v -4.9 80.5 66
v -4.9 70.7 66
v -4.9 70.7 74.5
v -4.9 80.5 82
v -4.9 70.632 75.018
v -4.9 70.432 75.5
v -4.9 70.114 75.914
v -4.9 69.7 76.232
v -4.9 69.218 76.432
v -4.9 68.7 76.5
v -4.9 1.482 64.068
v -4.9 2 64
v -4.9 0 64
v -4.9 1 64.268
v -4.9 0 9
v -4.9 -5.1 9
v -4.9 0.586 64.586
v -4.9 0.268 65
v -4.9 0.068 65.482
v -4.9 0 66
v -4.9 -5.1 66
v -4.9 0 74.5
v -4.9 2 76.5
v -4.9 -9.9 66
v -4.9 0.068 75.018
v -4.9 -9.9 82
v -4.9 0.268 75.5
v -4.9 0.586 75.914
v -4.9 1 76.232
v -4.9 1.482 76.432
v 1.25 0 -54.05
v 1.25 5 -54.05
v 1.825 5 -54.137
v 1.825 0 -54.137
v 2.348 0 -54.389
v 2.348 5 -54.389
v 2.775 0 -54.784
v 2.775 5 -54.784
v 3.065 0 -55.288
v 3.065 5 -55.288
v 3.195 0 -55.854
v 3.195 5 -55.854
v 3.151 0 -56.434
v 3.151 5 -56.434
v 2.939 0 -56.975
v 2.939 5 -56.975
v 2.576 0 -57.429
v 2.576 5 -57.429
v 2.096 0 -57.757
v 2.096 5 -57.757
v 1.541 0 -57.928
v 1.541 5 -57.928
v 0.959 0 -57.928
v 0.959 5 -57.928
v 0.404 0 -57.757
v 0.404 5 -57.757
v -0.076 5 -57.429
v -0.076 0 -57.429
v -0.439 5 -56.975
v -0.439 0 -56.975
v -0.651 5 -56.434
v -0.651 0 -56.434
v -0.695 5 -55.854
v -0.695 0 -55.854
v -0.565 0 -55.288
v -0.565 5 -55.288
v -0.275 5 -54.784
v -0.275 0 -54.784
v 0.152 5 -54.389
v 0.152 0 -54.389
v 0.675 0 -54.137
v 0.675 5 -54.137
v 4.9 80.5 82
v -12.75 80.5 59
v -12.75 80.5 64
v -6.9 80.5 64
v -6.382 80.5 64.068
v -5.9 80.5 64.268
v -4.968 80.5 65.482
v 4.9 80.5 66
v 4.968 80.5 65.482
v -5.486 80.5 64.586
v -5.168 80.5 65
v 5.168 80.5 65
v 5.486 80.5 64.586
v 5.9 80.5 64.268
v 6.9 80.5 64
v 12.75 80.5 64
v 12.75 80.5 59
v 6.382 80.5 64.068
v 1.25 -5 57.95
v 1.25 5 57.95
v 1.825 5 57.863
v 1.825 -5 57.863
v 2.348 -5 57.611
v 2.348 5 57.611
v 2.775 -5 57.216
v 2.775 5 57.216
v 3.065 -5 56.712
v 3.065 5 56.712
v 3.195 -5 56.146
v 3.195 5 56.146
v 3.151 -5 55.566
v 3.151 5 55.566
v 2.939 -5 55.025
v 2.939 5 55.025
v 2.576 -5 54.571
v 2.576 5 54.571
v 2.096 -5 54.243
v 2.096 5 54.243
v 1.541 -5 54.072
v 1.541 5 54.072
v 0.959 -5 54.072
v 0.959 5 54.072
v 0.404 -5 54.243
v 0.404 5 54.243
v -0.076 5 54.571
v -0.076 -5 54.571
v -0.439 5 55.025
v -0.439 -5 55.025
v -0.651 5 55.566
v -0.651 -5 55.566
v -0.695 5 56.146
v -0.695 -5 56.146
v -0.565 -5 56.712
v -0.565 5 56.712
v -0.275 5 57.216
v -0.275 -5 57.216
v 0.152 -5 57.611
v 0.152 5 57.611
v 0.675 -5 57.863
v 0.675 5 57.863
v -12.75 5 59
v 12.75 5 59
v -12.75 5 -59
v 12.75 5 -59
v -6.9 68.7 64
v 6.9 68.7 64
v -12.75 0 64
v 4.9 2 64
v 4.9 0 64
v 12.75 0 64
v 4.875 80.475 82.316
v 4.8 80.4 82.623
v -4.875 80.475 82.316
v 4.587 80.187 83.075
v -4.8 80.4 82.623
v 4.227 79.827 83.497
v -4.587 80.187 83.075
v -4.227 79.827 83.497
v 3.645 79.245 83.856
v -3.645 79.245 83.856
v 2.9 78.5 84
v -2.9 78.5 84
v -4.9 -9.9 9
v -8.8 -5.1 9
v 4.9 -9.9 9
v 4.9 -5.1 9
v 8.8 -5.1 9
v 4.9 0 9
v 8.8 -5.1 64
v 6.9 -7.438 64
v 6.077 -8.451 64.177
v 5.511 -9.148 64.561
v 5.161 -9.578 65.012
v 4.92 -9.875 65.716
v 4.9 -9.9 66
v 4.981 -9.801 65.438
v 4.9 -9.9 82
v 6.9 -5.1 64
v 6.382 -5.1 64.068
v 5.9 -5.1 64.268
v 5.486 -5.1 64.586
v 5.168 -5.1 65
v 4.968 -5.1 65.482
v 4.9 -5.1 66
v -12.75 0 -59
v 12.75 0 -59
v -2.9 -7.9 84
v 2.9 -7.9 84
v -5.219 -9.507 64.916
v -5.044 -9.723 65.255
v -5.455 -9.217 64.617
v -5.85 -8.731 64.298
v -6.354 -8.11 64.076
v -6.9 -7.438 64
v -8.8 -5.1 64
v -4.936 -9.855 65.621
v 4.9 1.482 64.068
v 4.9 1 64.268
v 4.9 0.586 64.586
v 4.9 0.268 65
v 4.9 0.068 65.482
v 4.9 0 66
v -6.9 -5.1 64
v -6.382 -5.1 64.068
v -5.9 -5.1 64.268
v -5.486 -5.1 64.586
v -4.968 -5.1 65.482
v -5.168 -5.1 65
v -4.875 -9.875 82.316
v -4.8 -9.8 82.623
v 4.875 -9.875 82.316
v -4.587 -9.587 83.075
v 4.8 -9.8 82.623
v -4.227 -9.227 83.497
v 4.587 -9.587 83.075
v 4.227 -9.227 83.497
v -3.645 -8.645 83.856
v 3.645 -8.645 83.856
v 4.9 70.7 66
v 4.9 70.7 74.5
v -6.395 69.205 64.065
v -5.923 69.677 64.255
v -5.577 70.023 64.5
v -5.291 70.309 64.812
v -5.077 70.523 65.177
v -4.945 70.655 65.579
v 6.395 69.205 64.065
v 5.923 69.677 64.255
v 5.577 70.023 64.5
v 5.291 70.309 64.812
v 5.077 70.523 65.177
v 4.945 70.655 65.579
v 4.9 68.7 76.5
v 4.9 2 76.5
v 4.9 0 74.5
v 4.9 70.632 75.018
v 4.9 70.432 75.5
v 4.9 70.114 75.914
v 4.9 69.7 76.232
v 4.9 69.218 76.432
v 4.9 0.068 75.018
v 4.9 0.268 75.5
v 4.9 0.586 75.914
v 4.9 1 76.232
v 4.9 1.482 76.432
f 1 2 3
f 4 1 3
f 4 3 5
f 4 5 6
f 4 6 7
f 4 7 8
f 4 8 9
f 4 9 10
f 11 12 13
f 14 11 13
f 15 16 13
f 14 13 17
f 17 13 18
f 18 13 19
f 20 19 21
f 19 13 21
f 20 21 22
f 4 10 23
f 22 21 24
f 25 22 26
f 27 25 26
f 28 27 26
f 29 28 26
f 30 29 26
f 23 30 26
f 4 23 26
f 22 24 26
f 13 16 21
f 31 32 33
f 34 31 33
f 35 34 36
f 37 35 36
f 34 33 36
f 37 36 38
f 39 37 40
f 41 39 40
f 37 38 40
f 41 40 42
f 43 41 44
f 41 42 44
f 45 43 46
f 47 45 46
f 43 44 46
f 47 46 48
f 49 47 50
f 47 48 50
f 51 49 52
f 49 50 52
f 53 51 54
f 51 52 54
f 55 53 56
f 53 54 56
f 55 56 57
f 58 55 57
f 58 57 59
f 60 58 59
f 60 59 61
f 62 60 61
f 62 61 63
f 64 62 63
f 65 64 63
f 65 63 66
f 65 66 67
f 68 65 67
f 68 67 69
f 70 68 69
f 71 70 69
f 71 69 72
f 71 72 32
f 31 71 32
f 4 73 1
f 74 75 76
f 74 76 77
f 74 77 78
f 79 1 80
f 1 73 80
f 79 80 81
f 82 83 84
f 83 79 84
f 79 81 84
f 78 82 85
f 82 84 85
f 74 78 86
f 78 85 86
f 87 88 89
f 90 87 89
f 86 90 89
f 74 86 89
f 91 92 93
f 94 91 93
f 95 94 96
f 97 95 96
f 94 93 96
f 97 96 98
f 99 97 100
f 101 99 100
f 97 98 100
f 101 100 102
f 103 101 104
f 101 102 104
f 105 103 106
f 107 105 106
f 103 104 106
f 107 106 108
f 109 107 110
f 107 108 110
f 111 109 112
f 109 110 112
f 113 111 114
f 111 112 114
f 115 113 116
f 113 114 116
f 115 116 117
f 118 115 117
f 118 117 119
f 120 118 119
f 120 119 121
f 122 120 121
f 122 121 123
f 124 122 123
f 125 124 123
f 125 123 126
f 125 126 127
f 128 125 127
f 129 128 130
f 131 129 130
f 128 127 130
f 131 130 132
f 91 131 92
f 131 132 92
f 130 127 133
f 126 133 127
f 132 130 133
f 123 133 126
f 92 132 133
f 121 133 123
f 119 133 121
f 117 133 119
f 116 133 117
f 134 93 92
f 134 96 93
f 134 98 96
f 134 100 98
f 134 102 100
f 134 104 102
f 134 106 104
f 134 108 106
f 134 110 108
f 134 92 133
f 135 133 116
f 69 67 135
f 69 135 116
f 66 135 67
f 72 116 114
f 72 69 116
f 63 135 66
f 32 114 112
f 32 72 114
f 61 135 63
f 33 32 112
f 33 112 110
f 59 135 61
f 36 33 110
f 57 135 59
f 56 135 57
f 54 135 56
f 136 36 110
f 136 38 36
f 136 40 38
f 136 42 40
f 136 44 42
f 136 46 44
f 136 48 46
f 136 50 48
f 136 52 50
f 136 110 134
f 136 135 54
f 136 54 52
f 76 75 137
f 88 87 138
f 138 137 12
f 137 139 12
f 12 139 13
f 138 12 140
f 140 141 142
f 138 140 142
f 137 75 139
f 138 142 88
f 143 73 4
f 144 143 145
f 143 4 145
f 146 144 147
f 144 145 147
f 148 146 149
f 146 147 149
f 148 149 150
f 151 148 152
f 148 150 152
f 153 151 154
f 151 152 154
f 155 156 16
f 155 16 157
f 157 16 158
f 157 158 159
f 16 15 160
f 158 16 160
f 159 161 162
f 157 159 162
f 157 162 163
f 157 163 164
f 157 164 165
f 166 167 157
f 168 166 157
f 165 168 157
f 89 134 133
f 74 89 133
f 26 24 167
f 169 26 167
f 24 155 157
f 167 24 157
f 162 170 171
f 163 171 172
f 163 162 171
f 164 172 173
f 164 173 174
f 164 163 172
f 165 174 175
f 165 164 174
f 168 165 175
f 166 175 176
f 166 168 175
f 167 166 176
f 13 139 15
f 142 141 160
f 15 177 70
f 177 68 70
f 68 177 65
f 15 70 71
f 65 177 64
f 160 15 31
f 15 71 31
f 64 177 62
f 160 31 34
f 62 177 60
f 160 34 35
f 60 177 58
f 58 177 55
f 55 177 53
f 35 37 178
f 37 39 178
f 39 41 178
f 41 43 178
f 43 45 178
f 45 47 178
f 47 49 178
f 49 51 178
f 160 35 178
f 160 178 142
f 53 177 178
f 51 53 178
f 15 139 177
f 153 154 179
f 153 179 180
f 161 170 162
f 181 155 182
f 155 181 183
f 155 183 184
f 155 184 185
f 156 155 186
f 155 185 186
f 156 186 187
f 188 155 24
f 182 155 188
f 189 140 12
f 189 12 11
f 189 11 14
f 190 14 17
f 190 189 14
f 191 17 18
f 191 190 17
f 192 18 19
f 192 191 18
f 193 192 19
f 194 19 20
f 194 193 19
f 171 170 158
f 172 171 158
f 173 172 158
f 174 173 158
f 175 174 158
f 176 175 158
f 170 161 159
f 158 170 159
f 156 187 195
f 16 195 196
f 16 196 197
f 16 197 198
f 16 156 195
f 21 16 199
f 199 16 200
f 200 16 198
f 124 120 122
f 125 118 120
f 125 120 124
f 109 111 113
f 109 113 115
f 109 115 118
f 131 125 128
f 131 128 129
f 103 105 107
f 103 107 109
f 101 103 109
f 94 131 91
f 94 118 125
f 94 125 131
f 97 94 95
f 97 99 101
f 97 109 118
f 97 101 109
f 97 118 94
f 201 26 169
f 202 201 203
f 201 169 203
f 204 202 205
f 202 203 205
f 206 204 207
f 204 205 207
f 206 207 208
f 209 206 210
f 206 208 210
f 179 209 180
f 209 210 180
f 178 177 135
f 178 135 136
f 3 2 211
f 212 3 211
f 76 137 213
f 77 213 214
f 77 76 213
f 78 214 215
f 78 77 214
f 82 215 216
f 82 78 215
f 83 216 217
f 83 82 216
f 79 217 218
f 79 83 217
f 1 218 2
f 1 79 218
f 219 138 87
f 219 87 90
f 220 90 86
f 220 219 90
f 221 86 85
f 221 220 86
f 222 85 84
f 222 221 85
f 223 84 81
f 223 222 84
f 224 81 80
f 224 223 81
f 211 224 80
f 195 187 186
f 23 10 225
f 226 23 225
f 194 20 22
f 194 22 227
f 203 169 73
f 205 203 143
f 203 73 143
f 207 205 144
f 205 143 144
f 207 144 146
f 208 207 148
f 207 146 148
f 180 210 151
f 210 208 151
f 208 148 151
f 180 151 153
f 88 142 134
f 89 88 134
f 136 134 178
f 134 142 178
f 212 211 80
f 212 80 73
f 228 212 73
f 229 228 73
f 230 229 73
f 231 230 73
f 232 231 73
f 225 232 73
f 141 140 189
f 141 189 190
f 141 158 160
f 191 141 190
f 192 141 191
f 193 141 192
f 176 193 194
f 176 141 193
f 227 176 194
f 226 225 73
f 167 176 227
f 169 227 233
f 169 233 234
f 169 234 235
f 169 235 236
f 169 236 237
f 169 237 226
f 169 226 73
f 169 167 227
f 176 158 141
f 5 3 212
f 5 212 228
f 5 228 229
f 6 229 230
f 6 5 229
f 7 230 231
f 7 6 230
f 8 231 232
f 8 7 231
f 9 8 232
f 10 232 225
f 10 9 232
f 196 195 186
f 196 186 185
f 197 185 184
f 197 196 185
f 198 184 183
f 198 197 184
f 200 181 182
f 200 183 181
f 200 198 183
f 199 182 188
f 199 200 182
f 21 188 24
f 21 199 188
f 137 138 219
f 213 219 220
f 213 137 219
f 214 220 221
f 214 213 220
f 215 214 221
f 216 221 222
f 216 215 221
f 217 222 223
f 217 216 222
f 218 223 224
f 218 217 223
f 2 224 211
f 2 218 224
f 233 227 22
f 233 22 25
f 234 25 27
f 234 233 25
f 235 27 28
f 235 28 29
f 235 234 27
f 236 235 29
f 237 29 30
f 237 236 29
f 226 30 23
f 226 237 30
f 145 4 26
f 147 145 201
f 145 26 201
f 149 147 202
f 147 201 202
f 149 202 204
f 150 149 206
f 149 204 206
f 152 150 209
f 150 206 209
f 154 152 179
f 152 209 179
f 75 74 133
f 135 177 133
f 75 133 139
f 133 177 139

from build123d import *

# Parameters (mm, degrees)
SKETCH1_W            = 25.5
SKETCH1_H            = 118
BOSS_EXTRUDE1_DEPTH  = 5
BOSS_EXTRUDE5_DEPTH  = 50
SKETCH2_R            = 1.95
CUT_EXTRUDE1_DEPTH   = 10
BOSS_EXTRUDE7_DEPTH  = 5
BOSS_EXTRUDE8_DEPTH  = 80.5
SKETCH9_W            = 9.8
SKETCH9_H            = 9.8
SKETCH9_H_2          = 9.9
BOSS_EXTRUDE10_DEPTH = 12.5
SKETCH10_W           = 9.8
SKETCH10_H           = 90.4
BOSS_EXTRUDE11_DEPTH = 7.5
FILLET1_R            = 2


with BuildPart() as part:
    # Sketch1 → Boss-Extrude1 (new body)
    with BuildSketch(Plane(origin=(0, 0, 0), x_dir=(1, 0, 0), z_dir=(0, 1, 0))):
        Rectangle(SKETCH1_W, SKETCH1_H)
    extrude(amount=BOSS_EXTRUDE1_DEPTH)

    # Sketch5 → Boss-Extrude5 (add)
    with BuildSketch(Plane.XY.offset(59)):
        Polygon((-4.9, 0), (-4.9, -5.1), (-8.8, -5.1), (-4.9, -9.9), (4.9, -9.9), (8.8, -5.1), (4.9, -5.1), (4.9, 0), align=None)
    extrude(amount=-BOSS_EXTRUDE5_DEPTH)

    # Sketch2 → Cut-Extrude1 (cut)
    with BuildSketch(Plane(origin=(0, 5, 0), x_dir=(1, 0, 0), z_dir=(0, 1, 0))):
        with Locations(Location((1.25, 56, 0), (0, 0, 270))):
            Circle(SKETCH2_R)
        with Locations(Location((1.25, -56, 0), (0, 0, 270))):
            Circle(SKETCH2_R)
    extrude(amount=-CUT_EXTRUDE1_DEPTH, mode=Mode.SUBTRACT)

    # Sketch5<4> → Boss-Extrude7 (add)
    with BuildSketch(Plane.XY.offset(59)):
        Polygon((-4.9, 0), (-4.9, -5.1), (-8.8, -5.1), (-4.9, -9.9), (4.9, -9.9), (8.8, -5.1), (4.9, -5.1), (4.9, 0), align=None)
    extrude(amount=BOSS_EXTRUDE7_DEPTH)

    # Sketch8 → Boss-Extrude8 (add)
    with BuildSketch(Plane(origin=(0, 0, 0), x_dir=(1, 0, 0), z_dir=(0, 1, 0))):
        Polygon((-4.9, -64), (12.75, -64), (12.75, -59), (-4.9, -59), (-12.75, -59), (-12.75, -64), align=None)
    extrude(amount=BOSS_EXTRUDE8_DEPTH)

    # Sketch9 → Boss-Extrude10 (add)
    with BuildSketch(Plane.XY.offset(64)):
        with Locations((0, 75.6)):
            Rectangle(SKETCH9_W, SKETCH9_H)
        with Locations((0, -4.95)):
            Rectangle(SKETCH9_W, SKETCH9_H_2)
    extrude(amount=BOSS_EXTRUDE10_DEPTH)

    # Sketch10 → Boss-Extrude11 (add)
    with BuildSketch(Plane.XY.offset(76.5)):
        with Locations((0, 35.3)):
            Rectangle(SKETCH10_W, SKETCH10_H)
    extrude(amount=BOSS_EXTRUDE11_DEPTH)

    # Fillet1
    # the kernel refuses this fillet: 2 mm, written as the material it adds along each edge
    with BuildSketch(Plane(origin=(4.9, -9.9, 64), x_dir=(0, 0, 1), z_dir=(0, 1, 0))) as fillet1_piece_1_section:
        with BuildLine():
            CenterArc((FILLET1_R, FILLET1_R), FILLET1_R, 180, 90)
            Line((0, FILLET1_R), (-FILLET1_R * 0.02, FILLET1_R))
            Line((-FILLET1_R * 0.02, FILLET1_R), (-FILLET1_R * 0.02, -FILLET1_R * 0.02))
            Line((-FILLET1_R * 0.02, -FILLET1_R * 0.02), (FILLET1_R, -FILLET1_R * 0.02))
            Line((FILLET1_R, -FILLET1_R * 0.02), (FILLET1_R, 0))
        make_face()
    fillet1_piece_1 = extrude(amount=4.8, mode=Mode.PRIVATE)
    fillet1_piece_1 = split(fillet1_piece_1, bisect_by=Plane(origin=(6.354004959, -8.110455435, 64.484419844), z_dir=(-0.7761140001162659, 0.6305926250944655, 0)), keep=Keep.TOP, mode=Mode.PRIVATE)
    add(fillet1_piece_1)
    with BuildSketch(Plane(origin=(4.9, 0, 64), x_dir=(0, 0, 1), z_dir=(-1, 0, 0))) as fillet1_piece_2_section:
        with BuildLine():
            CenterArc((FILLET1_R, FILLET1_R), FILLET1_R, 180, 90)
            Line((0, FILLET1_R), (-FILLET1_R * 0.02, FILLET1_R))
            Line((-FILLET1_R * 0.02, FILLET1_R), (-FILLET1_R * 0.02, -FILLET1_R * 0.02))
            Line((-FILLET1_R * 0.02, -FILLET1_R * 0.02), (FILLET1_R, -FILLET1_R * 0.02))
            Line((FILLET1_R, -FILLET1_R * 0.02), (FILLET1_R, 0))
        make_face()
    fillet1_piece_2 = extrude(amount=9.8, mode=Mode.PRIVATE)
    fillet1_piece_2 = split(fillet1_piece_2, bisect_by=Plane(origin=(0, 0, 64.406946259), z_dir=(0, 1, 0)), keep=Keep.TOP, mode=Mode.PRIVATE)
    add(fillet1_piece_2)
    with BuildSketch(Plane(origin=(4.9, 0, 76.5), x_dir=(0, 0, -1), z_dir=(-1, 0, 0))) as fillet1_piece_3:
        with BuildLine():
            CenterArc((FILLET1_R, -FILLET1_R), FILLET1_R, 90, 90)
            Line((0, -FILLET1_R), (-FILLET1_R * 0.02, -FILLET1_R))
            Line((-FILLET1_R * 0.02, -FILLET1_R), (-FILLET1_R * 0.02, FILLET1_R * 0.02))
            Line((-FILLET1_R * 0.02, FILLET1_R * 0.02), (FILLET1_R, FILLET1_R * 0.02))
            Line((FILLET1_R, FILLET1_R * 0.02), (FILLET1_R, 0))
        make_face()
    extrude(amount=9.8)
    with BuildSketch(Plane(origin=(4.9, 70.7, 64), x_dir=(0, 0, 1), z_dir=(0, 1, 0)), Plane(origin=(-4.9, 80.5, 64), x_dir=(0, 0, 1), z_dir=(0, -1, 0)), Plane(origin=(-4.9, 70.7, 64), x_dir=(0, 0, 1), z_dir=(1, 0, 0)), Plane(origin=(-4.9, 70.7, 76.5), x_dir=(0, -1, 0), z_dir=(1, 0, 0))) as fillet1_piece_4:
        with BuildLine():
            CenterArc((FILLET1_R, FILLET1_R), FILLET1_R, 180, 90)
            Line((0, FILLET1_R), (-FILLET1_R * 0.02, FILLET1_R))
            Line((-FILLET1_R * 0.02, FILLET1_R), (-FILLET1_R * 0.02, -FILLET1_R * 0.02))
            Line((-FILLET1_R * 0.02, -FILLET1_R * 0.02), (FILLET1_R, -FILLET1_R * 0.02))
            Line((FILLET1_R, -FILLET1_R * 0.02), (FILLET1_R, 0))
        make_face()
    extrude(amount=9.8)
    with BuildSketch(Plane(origin=(-4.9, -5.1, 64), x_dir=(-1, 0, 0), z_dir=(0, -1, 0))) as fillet1_piece_5_section:
        with BuildLine():
            CenterArc((FILLET1_R, -FILLET1_R), FILLET1_R, 90, 90)
            Line((0, -FILLET1_R), (-FILLET1_R * 0.02, -FILLET1_R))
            Line((-FILLET1_R * 0.02, -FILLET1_R), (-FILLET1_R * 0.02, FILLET1_R * 0.02))
            Line((-FILLET1_R * 0.02, FILLET1_R * 0.02), (FILLET1_R, FILLET1_R * 0.02))
            Line((FILLET1_R, FILLET1_R * 0.02), (FILLET1_R, 0))
        make_face()
    fillet1_piece_5 = extrude(amount=4.8, mode=Mode.PRIVATE)
    fillet1_piece_5 = split(fillet1_piece_5, bisect_by=Plane(origin=(-6.354004959, -8.110455435, 64.484419844), z_dir=(0.7761140001162656, 0.6305926250944656, 0)), keep=Keep.TOP, mode=Mode.PRIVATE)
    add(fillet1_piece_5)
    with BuildSketch(Plane(origin=(4.9, 65.7, 64), x_dir=(0, 0, 1), z_dir=(0, 1, 0))) as fillet1_piece_6a_section:
        with BuildLine():
            CenterArc((FILLET1_R, FILLET1_R), FILLET1_R, 180, 90)
            Line((0, FILLET1_R), (-FILLET1_R * 0.02, FILLET1_R))
            Line((-FILLET1_R * 0.02, FILLET1_R), (-FILLET1_R * 0.02, -FILLET1_R * 0.02))
            Line((-FILLET1_R * 0.02, -FILLET1_R * 0.02), (FILLET1_R, -FILLET1_R * 0.02))
            Line((FILLET1_R, -FILLET1_R * 0.02), (FILLET1_R, 0))
        make_face()
    fillet1_piece_6a = extrude(amount=14.8, mode=Mode.PRIVATE)
    fillet1_piece_6a = split(fillet1_piece_6a, bisect_by=Plane(origin=(5.352790229, 70.7, 64.452790229), z_dir=(0, -1, 0)), keep=Keep.TOP, mode=Mode.PRIVATE)
    with BuildSketch(Plane(origin=(-4.9, 70.7, 64), x_dir=(0, 0, 1), z_dir=(1, 0, 0))) as fillet1_piece_6b_section:
        with BuildLine():
            CenterArc((FILLET1_R, FILLET1_R), FILLET1_R, 180, 90)
            Line((0, FILLET1_R), (-FILLET1_R * 0.02, FILLET1_R))
            Line((-FILLET1_R * 0.02, FILLET1_R), (-FILLET1_R * 0.02, -FILLET1_R * 0.02))
            Line((-FILLET1_R * 0.02, -FILLET1_R * 0.02), (FILLET1_R, -FILLET1_R * 0.02))
            Line((FILLET1_R, -FILLET1_R * 0.02), (FILLET1_R, 0))
        make_face()
    fillet1_piece_6b = extrude(amount=14.8, mode=Mode.PRIVATE)
    fillet1_piece_6b = split(fillet1_piece_6b, bisect_by=Plane(origin=(4.9, 70.247209771, 64.452790229), z_dir=(1, 0, 0)), keep=Keep.TOP, mode=Mode.PRIVATE)
    fillet1_piece_6 = fillet1_piece_6a & fillet1_piece_6b
    add(fillet1_piece_6)
    with BuildSketch(Plane(origin=(-9.9, 70.7, 64), x_dir=(0, 0, 1), z_dir=(1, 0, 0))) as fillet1_piece_7a_section:
        with BuildLine():
            CenterArc((FILLET1_R, FILLET1_R), FILLET1_R, 180, 90)
            Line((0, FILLET1_R), (-FILLET1_R * 0.02, FILLET1_R))
            Line((-FILLET1_R * 0.02, FILLET1_R), (-FILLET1_R * 0.02, -FILLET1_R * 0.02))
            Line((-FILLET1_R * 0.02, -FILLET1_R * 0.02), (FILLET1_R, -FILLET1_R * 0.02))
            Line((FILLET1_R, -FILLET1_R * 0.02), (FILLET1_R, 0))
        make_face()
    fillet1_piece_7a = extrude(amount=14.8, mode=Mode.PRIVATE)
    fillet1_piece_7a = split(fillet1_piece_7a, bisect_by=Plane(origin=(-4.9, 70.247209771, 64.452790229), z_dir=(-1, 0, 0)), keep=Keep.TOP, mode=Mode.PRIVATE)
    with BuildSketch(Plane(origin=(-4.9, 80.5, 64), x_dir=(0, 0, 1), z_dir=(0, -1, 0))) as fillet1_piece_7b_section:
        with BuildLine():
            CenterArc((FILLET1_R, FILLET1_R), FILLET1_R, 180, 90)
            Line((0, FILLET1_R), (-FILLET1_R * 0.02, FILLET1_R))
            Line((-FILLET1_R * 0.02, FILLET1_R), (-FILLET1_R * 0.02, -FILLET1_R * 0.02))
            Line((-FILLET1_R * 0.02, -FILLET1_R * 0.02), (FILLET1_R, -FILLET1_R * 0.02))
            Line((FILLET1_R, -FILLET1_R * 0.02), (FILLET1_R, 0))
        make_face()
    fillet1_piece_7b = extrude(amount=14.8, mode=Mode.PRIVATE)
    fillet1_piece_7b = split(fillet1_piece_7b, bisect_by=Plane(origin=(-5.352790229, 70.7, 64.452790229), z_dir=(0, -1, 0)), keep=Keep.TOP, mode=Mode.PRIVATE)
    fillet1_piece_7 = fillet1_piece_7a & fillet1_piece_7b
    add(fillet1_piece_7)
    # the kernel refuses this fillet: 2 mm, written as the material it takes off along each edge
    with BuildSketch(Plane(origin=(-4.9, -9.9, 84), x_dir=(1, 0, 0), z_dir=(0, 1, 0))) as fillet1_2_piece_1:
        with BuildLine():
            CenterArc((FILLET1_R, FILLET1_R), FILLET1_R, 180, 90)
            Line((0, FILLET1_R), (-FILLET1_R * 0.02, FILLET1_R))
            Line((-FILLET1_R * 0.02, FILLET1_R), (-FILLET1_R * 0.02, -FILLET1_R * 0.02))
            Line((-FILLET1_R * 0.02, -FILLET1_R * 0.02), (FILLET1_R, -FILLET1_R * 0.02))
            Line((FILLET1_R, -FILLET1_R * 0.02), (FILLET1_R, 0))
        make_face()
    extrude(amount=90.4, mode=Mode.SUBTRACT)
    with BuildSketch(Plane(origin=(4.9, -9.9, 84), x_dir=(0, 1, 0), z_dir=(-1, 0, 0)), Plane(origin=(-4.9, 80.5, 84), x_dir=(0, -1, 0), z_dir=(1, 0, 0))) as fillet1_2_piece_2:
        with BuildLine():
            CenterArc((FILLET1_R, FILLET1_R), FILLET1_R, 180, 90)
            Line((0, FILLET1_R), (-FILLET1_R * 0.02, FILLET1_R))
            Line((-FILLET1_R * 0.02, FILLET1_R), (-FILLET1_R * 0.02, -FILLET1_R * 0.02))
            Line((-FILLET1_R * 0.02, -FILLET1_R * 0.02), (FILLET1_R, -FILLET1_R * 0.02))
            Line((FILLET1_R, -FILLET1_R * 0.02), (FILLET1_R, 0))
        make_face()
    extrude(amount=9.8, mode=Mode.SUBTRACT)
    with BuildSketch(Plane(origin=(4.9, 80.5, 84), x_dir=(0, 0, -1), z_dir=(0, -1, 0))) as fillet1_2_piece_3:
        with BuildLine():
            CenterArc((FILLET1_R, -FILLET1_R), FILLET1_R, 90, 90)
            Line((0, -FILLET1_R), (-FILLET1_R * 0.02, -FILLET1_R))
            Line((-FILLET1_R * 0.02, -FILLET1_R), (-FILLET1_R * 0.02, FILLET1_R * 0.02))
            Line((-FILLET1_R * 0.02, FILLET1_R * 0.02), (FILLET1_R, FILLET1_R * 0.02))
            Line((FILLET1_R, FILLET1_R * 0.02), (FILLET1_R, 0))
        make_face()
    extrude(amount=90.4, mode=Mode.SUBTRACT)
    with BuildSketch(Plane(origin=(4.9, -9.9, 84), x_dir=(0, 1, 0), z_dir=(-1, 0, 0))) as fillet1_2_piece_4a_section:
        with BuildLine():
            CenterArc((FILLET1_R, FILLET1_R), FILLET1_R, 180, 90)
            Line((0, FILLET1_R), (-FILLET1_R * 0.02, FILLET1_R))
            Line((-FILLET1_R * 0.02, FILLET1_R), (-FILLET1_R * 0.02, -FILLET1_R * 0.02))
            Line((-FILLET1_R * 0.02, -FILLET1_R * 0.02), (FILLET1_R, -FILLET1_R * 0.02))
            Line((FILLET1_R, -FILLET1_R * 0.02), (FILLET1_R, 0))
        make_face()
    fillet1_2_piece_4a = extrude(amount=14.8, mode=Mode.PRIVATE)
    fillet1_2_piece_4a = split(fillet1_2_piece_4a, bisect_by=Plane(origin=(-4.9, -9.447209771, 83.547209771), z_dir=(-1, 0, 0)), keep=Keep.TOP, mode=Mode.PRIVATE)
    with BuildSketch(Plane(origin=(-4.9, -14.9, 84), x_dir=(1, 0, 0), z_dir=(0, 1, 0))) as fillet1_2_piece_4b_section:
        with BuildLine():
            CenterArc((FILLET1_R, FILLET1_R), FILLET1_R, 180, 90)
            Line((0, FILLET1_R), (-FILLET1_R * 0.02, FILLET1_R))
            Line((-FILLET1_R * 0.02, FILLET1_R), (-FILLET1_R * 0.02, -FILLET1_R * 0.02))
            Line((-FILLET1_R * 0.02, -FILLET1_R * 0.02), (FILLET1_R, -FILLET1_R * 0.02))
            Line((FILLET1_R, -FILLET1_R * 0.02), (FILLET1_R, 0))
        make_face()
    fillet1_2_piece_4b = extrude(amount=95.4, mode=Mode.PRIVATE)
    fillet1_2_piece_4b = split(fillet1_2_piece_4b, bisect_by=Plane(origin=(-4.447209771, -9.9, 83.547209771), z_dir=(0, -1, 0)), keep=Keep.TOP, mode=Mode.PRIVATE)
    fillet1_2_piece_4 = fillet1_2_piece_4a & fillet1_2_piece_4b
    add(fillet1_2_piece_4, mode=Mode.SUBTRACT)
    with BuildSketch(Plane(origin=(-4.9, -9.9, 84), x_dir=(1, 0, 0), z_dir=(0, 1, 0))) as fillet1_2_piece_5a_section:
        with BuildLine():
            CenterArc((FILLET1_R, FILLET1_R), FILLET1_R, 180, 90)
            Line((0, FILLET1_R), (-FILLET1_R * 0.02, FILLET1_R))
            Line((-FILLET1_R * 0.02, FILLET1_R), (-FILLET1_R * 0.02, -FILLET1_R * 0.02))
            Line((-FILLET1_R * 0.02, -FILLET1_R * 0.02), (FILLET1_R, -FILLET1_R * 0.02))
            Line((FILLET1_R, -FILLET1_R * 0.02), (FILLET1_R, 0))
        make_face()
    fillet1_2_piece_5a = extrude(amount=95.4, mode=Mode.PRIVATE)
    fillet1_2_piece_5a = split(fillet1_2_piece_5a, bisect_by=Plane(origin=(-4.447209771, 80.5, 83.547209771), z_dir=(0, 1, 0)), keep=Keep.TOP, mode=Mode.PRIVATE)
    with BuildSketch(Plane(origin=(-9.9, 80.5, 84), x_dir=(0, -1, 0), z_dir=(1, 0, 0))) as fillet1_2_piece_5b_section:
        with BuildLine():
            CenterArc((FILLET1_R, FILLET1_R), FILLET1_R, 180, 90)
            Line((0, FILLET1_R), (-FILLET1_R * 0.02, FILLET1_R))
            Line((-FILLET1_R * 0.02, FILLET1_R), (-FILLET1_R * 0.02, -FILLET1_R * 0.02))
            Line((-FILLET1_R * 0.02, -FILLET1_R * 0.02), (FILLET1_R, -FILLET1_R * 0.02))
            Line((FILLET1_R, -FILLET1_R * 0.02), (FILLET1_R, 0))
        make_face()
    fillet1_2_piece_5b = extrude(amount=14.8, mode=Mode.PRIVATE)
    fillet1_2_piece_5b = split(fillet1_2_piece_5b, bisect_by=Plane(origin=(-4.9, 80.047209771, 83.547209771), z_dir=(-1, 0, 0)), keep=Keep.TOP, mode=Mode.PRIVATE)
    fillet1_2_piece_5 = fillet1_2_piece_5a & fillet1_2_piece_5b
    add(fillet1_2_piece_5, mode=Mode.SUBTRACT)
    with BuildSketch(Plane(origin=(4.9, 80.5, 84), x_dir=(0, 0, -1), z_dir=(0, -1, 0))) as fillet1_2_piece_6a_section:
        with BuildLine():
            CenterArc((FILLET1_R, -FILLET1_R), FILLET1_R, 90, 90)
            Line((0, -FILLET1_R), (-FILLET1_R * 0.02, -FILLET1_R))
            Line((-FILLET1_R * 0.02, -FILLET1_R), (-FILLET1_R * 0.02, FILLET1_R * 0.02))
            Line((-FILLET1_R * 0.02, FILLET1_R * 0.02), (FILLET1_R, FILLET1_R * 0.02))
            Line((FILLET1_R, FILLET1_R * 0.02), (FILLET1_R, 0))
        make_face()
    fillet1_2_piece_6a = extrude(amount=95.4, mode=Mode.PRIVATE)
    fillet1_2_piece_6a = split(fillet1_2_piece_6a, bisect_by=Plane(origin=(4.447209771, -9.9, 83.547209771), z_dir=(0, -1, 0)), keep=Keep.TOP, mode=Mode.PRIVATE)
    with BuildSketch(Plane(origin=(9.9, -9.9, 84), x_dir=(0, 1, 0), z_dir=(-1, 0, 0))) as fillet1_2_piece_6b_section:
        with BuildLine():
            CenterArc((FILLET1_R, FILLET1_R), FILLET1_R, 180, 90)
            Line((0, FILLET1_R), (-FILLET1_R * 0.02, FILLET1_R))
            Line((-FILLET1_R * 0.02, FILLET1_R), (-FILLET1_R * 0.02, -FILLET1_R * 0.02))
            Line((-FILLET1_R * 0.02, -FILLET1_R * 0.02), (FILLET1_R, -FILLET1_R * 0.02))
            Line((FILLET1_R, -FILLET1_R * 0.02), (FILLET1_R, 0))
        make_face()
    fillet1_2_piece_6b = extrude(amount=14.8, mode=Mode.PRIVATE)
    fillet1_2_piece_6b = split(fillet1_2_piece_6b, bisect_by=Plane(origin=(4.9, -9.447209771, 83.547209771), z_dir=(1, 0, 0)), keep=Keep.TOP, mode=Mode.PRIVATE)
    fillet1_2_piece_6 = fillet1_2_piece_6a & fillet1_2_piece_6b
    add(fillet1_2_piece_6, mode=Mode.SUBTRACT)
    with BuildSketch(Plane(origin=(4.9, 85.5, 84), x_dir=(0, 0, -1), z_dir=(0, -1, 0))) as fillet1_2_piece_7a_section:
        with BuildLine():
            CenterArc((FILLET1_R, -FILLET1_R), FILLET1_R, 90, 90)
            Line((0, -FILLET1_R), (-FILLET1_R * 0.02, -FILLET1_R))
            Line((-FILLET1_R * 0.02, -FILLET1_R), (-FILLET1_R * 0.02, FILLET1_R * 0.02))
            Line((-FILLET1_R * 0.02, FILLET1_R * 0.02), (FILLET1_R, FILLET1_R * 0.02))
            Line((FILLET1_R, FILLET1_R * 0.02), (FILLET1_R, 0))
        make_face()
    fillet1_2_piece_7a = extrude(amount=95.4, mode=Mode.PRIVATE)
    fillet1_2_piece_7a = split(fillet1_2_piece_7a, bisect_by=Plane(origin=(4.447209771, 80.5, 83.547209771), z_dir=(0, 1, 0)), keep=Keep.TOP, mode=Mode.PRIVATE)
    with BuildSketch(Plane(origin=(-4.9, 80.5, 84), x_dir=(0, -1, 0), z_dir=(1, 0, 0))) as fillet1_2_piece_7b_section:
        with BuildLine():
            CenterArc((FILLET1_R, FILLET1_R), FILLET1_R, 180, 90)
            Line((0, FILLET1_R), (-FILLET1_R * 0.02, FILLET1_R))
            Line((-FILLET1_R * 0.02, FILLET1_R), (-FILLET1_R * 0.02, -FILLET1_R * 0.02))
            Line((-FILLET1_R * 0.02, -FILLET1_R * 0.02), (FILLET1_R, -FILLET1_R * 0.02))
            Line((FILLET1_R, -FILLET1_R * 0.02), (FILLET1_R, 0))
        make_face()
    fillet1_2_piece_7b = extrude(amount=14.8, mode=Mode.PRIVATE)
    fillet1_2_piece_7b = split(fillet1_2_piece_7b, bisect_by=Plane(origin=(4.9, 80.047209771, 83.547209771), z_dir=(1, 0, 0)), keep=Keep.TOP, mode=Mode.PRIVATE)
    fillet1_2_piece_7 = fillet1_2_piece_7a & fillet1_2_piece_7b
    add(fillet1_2_piece_7, mode=Mode.SUBTRACT)


solid = part.part
